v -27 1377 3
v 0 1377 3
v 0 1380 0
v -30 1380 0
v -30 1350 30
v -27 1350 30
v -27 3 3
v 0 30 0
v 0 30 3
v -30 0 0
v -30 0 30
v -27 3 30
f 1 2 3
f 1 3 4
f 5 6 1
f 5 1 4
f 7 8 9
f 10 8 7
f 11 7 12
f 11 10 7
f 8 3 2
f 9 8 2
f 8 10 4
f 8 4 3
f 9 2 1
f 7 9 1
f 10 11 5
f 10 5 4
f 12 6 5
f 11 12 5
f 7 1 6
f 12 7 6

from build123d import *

# Parameters (mm, degrees)
F1_DEPTH = 1380
F2_SIZE  = 29.99999
F3_SIZE  = 29.99999


# Not quite as in the source:
# - a fillet or chamfer is up to 0.001 mm smaller than in the source, because OpenCascade refuses the exact size


with BuildPart() as f1:
    # F0 (on Front) → F1 (new body)
    with BuildSketch(Plane.XZ):
        Polygon((-30, 0), (0, 0), (0, 3), (-27, 3), (-27, 30), (-30, 30), align=None)
    extrude(amount=-F1_DEPTH)

    # F2 (size 30 in the source; OpenCascade refuses exactly that, so slightly less here)
    f2_edges = [f1.edges().sort_by_distance(p)[0] for p in [
        (0, 0, 1.5),
    ]]
    chamfer(f2_edges, length=F2_SIZE)

    # F3 (size 30 in the source; OpenCascade refuses exactly that, so slightly less here)
    f3_edges = [f1.edges().sort_by_distance(p)[0] for p in [
        (-28.5, 1380, 30),
    ]]
    chamfer(f3_edges, length=F3_SIZE)


solid = f1.part
